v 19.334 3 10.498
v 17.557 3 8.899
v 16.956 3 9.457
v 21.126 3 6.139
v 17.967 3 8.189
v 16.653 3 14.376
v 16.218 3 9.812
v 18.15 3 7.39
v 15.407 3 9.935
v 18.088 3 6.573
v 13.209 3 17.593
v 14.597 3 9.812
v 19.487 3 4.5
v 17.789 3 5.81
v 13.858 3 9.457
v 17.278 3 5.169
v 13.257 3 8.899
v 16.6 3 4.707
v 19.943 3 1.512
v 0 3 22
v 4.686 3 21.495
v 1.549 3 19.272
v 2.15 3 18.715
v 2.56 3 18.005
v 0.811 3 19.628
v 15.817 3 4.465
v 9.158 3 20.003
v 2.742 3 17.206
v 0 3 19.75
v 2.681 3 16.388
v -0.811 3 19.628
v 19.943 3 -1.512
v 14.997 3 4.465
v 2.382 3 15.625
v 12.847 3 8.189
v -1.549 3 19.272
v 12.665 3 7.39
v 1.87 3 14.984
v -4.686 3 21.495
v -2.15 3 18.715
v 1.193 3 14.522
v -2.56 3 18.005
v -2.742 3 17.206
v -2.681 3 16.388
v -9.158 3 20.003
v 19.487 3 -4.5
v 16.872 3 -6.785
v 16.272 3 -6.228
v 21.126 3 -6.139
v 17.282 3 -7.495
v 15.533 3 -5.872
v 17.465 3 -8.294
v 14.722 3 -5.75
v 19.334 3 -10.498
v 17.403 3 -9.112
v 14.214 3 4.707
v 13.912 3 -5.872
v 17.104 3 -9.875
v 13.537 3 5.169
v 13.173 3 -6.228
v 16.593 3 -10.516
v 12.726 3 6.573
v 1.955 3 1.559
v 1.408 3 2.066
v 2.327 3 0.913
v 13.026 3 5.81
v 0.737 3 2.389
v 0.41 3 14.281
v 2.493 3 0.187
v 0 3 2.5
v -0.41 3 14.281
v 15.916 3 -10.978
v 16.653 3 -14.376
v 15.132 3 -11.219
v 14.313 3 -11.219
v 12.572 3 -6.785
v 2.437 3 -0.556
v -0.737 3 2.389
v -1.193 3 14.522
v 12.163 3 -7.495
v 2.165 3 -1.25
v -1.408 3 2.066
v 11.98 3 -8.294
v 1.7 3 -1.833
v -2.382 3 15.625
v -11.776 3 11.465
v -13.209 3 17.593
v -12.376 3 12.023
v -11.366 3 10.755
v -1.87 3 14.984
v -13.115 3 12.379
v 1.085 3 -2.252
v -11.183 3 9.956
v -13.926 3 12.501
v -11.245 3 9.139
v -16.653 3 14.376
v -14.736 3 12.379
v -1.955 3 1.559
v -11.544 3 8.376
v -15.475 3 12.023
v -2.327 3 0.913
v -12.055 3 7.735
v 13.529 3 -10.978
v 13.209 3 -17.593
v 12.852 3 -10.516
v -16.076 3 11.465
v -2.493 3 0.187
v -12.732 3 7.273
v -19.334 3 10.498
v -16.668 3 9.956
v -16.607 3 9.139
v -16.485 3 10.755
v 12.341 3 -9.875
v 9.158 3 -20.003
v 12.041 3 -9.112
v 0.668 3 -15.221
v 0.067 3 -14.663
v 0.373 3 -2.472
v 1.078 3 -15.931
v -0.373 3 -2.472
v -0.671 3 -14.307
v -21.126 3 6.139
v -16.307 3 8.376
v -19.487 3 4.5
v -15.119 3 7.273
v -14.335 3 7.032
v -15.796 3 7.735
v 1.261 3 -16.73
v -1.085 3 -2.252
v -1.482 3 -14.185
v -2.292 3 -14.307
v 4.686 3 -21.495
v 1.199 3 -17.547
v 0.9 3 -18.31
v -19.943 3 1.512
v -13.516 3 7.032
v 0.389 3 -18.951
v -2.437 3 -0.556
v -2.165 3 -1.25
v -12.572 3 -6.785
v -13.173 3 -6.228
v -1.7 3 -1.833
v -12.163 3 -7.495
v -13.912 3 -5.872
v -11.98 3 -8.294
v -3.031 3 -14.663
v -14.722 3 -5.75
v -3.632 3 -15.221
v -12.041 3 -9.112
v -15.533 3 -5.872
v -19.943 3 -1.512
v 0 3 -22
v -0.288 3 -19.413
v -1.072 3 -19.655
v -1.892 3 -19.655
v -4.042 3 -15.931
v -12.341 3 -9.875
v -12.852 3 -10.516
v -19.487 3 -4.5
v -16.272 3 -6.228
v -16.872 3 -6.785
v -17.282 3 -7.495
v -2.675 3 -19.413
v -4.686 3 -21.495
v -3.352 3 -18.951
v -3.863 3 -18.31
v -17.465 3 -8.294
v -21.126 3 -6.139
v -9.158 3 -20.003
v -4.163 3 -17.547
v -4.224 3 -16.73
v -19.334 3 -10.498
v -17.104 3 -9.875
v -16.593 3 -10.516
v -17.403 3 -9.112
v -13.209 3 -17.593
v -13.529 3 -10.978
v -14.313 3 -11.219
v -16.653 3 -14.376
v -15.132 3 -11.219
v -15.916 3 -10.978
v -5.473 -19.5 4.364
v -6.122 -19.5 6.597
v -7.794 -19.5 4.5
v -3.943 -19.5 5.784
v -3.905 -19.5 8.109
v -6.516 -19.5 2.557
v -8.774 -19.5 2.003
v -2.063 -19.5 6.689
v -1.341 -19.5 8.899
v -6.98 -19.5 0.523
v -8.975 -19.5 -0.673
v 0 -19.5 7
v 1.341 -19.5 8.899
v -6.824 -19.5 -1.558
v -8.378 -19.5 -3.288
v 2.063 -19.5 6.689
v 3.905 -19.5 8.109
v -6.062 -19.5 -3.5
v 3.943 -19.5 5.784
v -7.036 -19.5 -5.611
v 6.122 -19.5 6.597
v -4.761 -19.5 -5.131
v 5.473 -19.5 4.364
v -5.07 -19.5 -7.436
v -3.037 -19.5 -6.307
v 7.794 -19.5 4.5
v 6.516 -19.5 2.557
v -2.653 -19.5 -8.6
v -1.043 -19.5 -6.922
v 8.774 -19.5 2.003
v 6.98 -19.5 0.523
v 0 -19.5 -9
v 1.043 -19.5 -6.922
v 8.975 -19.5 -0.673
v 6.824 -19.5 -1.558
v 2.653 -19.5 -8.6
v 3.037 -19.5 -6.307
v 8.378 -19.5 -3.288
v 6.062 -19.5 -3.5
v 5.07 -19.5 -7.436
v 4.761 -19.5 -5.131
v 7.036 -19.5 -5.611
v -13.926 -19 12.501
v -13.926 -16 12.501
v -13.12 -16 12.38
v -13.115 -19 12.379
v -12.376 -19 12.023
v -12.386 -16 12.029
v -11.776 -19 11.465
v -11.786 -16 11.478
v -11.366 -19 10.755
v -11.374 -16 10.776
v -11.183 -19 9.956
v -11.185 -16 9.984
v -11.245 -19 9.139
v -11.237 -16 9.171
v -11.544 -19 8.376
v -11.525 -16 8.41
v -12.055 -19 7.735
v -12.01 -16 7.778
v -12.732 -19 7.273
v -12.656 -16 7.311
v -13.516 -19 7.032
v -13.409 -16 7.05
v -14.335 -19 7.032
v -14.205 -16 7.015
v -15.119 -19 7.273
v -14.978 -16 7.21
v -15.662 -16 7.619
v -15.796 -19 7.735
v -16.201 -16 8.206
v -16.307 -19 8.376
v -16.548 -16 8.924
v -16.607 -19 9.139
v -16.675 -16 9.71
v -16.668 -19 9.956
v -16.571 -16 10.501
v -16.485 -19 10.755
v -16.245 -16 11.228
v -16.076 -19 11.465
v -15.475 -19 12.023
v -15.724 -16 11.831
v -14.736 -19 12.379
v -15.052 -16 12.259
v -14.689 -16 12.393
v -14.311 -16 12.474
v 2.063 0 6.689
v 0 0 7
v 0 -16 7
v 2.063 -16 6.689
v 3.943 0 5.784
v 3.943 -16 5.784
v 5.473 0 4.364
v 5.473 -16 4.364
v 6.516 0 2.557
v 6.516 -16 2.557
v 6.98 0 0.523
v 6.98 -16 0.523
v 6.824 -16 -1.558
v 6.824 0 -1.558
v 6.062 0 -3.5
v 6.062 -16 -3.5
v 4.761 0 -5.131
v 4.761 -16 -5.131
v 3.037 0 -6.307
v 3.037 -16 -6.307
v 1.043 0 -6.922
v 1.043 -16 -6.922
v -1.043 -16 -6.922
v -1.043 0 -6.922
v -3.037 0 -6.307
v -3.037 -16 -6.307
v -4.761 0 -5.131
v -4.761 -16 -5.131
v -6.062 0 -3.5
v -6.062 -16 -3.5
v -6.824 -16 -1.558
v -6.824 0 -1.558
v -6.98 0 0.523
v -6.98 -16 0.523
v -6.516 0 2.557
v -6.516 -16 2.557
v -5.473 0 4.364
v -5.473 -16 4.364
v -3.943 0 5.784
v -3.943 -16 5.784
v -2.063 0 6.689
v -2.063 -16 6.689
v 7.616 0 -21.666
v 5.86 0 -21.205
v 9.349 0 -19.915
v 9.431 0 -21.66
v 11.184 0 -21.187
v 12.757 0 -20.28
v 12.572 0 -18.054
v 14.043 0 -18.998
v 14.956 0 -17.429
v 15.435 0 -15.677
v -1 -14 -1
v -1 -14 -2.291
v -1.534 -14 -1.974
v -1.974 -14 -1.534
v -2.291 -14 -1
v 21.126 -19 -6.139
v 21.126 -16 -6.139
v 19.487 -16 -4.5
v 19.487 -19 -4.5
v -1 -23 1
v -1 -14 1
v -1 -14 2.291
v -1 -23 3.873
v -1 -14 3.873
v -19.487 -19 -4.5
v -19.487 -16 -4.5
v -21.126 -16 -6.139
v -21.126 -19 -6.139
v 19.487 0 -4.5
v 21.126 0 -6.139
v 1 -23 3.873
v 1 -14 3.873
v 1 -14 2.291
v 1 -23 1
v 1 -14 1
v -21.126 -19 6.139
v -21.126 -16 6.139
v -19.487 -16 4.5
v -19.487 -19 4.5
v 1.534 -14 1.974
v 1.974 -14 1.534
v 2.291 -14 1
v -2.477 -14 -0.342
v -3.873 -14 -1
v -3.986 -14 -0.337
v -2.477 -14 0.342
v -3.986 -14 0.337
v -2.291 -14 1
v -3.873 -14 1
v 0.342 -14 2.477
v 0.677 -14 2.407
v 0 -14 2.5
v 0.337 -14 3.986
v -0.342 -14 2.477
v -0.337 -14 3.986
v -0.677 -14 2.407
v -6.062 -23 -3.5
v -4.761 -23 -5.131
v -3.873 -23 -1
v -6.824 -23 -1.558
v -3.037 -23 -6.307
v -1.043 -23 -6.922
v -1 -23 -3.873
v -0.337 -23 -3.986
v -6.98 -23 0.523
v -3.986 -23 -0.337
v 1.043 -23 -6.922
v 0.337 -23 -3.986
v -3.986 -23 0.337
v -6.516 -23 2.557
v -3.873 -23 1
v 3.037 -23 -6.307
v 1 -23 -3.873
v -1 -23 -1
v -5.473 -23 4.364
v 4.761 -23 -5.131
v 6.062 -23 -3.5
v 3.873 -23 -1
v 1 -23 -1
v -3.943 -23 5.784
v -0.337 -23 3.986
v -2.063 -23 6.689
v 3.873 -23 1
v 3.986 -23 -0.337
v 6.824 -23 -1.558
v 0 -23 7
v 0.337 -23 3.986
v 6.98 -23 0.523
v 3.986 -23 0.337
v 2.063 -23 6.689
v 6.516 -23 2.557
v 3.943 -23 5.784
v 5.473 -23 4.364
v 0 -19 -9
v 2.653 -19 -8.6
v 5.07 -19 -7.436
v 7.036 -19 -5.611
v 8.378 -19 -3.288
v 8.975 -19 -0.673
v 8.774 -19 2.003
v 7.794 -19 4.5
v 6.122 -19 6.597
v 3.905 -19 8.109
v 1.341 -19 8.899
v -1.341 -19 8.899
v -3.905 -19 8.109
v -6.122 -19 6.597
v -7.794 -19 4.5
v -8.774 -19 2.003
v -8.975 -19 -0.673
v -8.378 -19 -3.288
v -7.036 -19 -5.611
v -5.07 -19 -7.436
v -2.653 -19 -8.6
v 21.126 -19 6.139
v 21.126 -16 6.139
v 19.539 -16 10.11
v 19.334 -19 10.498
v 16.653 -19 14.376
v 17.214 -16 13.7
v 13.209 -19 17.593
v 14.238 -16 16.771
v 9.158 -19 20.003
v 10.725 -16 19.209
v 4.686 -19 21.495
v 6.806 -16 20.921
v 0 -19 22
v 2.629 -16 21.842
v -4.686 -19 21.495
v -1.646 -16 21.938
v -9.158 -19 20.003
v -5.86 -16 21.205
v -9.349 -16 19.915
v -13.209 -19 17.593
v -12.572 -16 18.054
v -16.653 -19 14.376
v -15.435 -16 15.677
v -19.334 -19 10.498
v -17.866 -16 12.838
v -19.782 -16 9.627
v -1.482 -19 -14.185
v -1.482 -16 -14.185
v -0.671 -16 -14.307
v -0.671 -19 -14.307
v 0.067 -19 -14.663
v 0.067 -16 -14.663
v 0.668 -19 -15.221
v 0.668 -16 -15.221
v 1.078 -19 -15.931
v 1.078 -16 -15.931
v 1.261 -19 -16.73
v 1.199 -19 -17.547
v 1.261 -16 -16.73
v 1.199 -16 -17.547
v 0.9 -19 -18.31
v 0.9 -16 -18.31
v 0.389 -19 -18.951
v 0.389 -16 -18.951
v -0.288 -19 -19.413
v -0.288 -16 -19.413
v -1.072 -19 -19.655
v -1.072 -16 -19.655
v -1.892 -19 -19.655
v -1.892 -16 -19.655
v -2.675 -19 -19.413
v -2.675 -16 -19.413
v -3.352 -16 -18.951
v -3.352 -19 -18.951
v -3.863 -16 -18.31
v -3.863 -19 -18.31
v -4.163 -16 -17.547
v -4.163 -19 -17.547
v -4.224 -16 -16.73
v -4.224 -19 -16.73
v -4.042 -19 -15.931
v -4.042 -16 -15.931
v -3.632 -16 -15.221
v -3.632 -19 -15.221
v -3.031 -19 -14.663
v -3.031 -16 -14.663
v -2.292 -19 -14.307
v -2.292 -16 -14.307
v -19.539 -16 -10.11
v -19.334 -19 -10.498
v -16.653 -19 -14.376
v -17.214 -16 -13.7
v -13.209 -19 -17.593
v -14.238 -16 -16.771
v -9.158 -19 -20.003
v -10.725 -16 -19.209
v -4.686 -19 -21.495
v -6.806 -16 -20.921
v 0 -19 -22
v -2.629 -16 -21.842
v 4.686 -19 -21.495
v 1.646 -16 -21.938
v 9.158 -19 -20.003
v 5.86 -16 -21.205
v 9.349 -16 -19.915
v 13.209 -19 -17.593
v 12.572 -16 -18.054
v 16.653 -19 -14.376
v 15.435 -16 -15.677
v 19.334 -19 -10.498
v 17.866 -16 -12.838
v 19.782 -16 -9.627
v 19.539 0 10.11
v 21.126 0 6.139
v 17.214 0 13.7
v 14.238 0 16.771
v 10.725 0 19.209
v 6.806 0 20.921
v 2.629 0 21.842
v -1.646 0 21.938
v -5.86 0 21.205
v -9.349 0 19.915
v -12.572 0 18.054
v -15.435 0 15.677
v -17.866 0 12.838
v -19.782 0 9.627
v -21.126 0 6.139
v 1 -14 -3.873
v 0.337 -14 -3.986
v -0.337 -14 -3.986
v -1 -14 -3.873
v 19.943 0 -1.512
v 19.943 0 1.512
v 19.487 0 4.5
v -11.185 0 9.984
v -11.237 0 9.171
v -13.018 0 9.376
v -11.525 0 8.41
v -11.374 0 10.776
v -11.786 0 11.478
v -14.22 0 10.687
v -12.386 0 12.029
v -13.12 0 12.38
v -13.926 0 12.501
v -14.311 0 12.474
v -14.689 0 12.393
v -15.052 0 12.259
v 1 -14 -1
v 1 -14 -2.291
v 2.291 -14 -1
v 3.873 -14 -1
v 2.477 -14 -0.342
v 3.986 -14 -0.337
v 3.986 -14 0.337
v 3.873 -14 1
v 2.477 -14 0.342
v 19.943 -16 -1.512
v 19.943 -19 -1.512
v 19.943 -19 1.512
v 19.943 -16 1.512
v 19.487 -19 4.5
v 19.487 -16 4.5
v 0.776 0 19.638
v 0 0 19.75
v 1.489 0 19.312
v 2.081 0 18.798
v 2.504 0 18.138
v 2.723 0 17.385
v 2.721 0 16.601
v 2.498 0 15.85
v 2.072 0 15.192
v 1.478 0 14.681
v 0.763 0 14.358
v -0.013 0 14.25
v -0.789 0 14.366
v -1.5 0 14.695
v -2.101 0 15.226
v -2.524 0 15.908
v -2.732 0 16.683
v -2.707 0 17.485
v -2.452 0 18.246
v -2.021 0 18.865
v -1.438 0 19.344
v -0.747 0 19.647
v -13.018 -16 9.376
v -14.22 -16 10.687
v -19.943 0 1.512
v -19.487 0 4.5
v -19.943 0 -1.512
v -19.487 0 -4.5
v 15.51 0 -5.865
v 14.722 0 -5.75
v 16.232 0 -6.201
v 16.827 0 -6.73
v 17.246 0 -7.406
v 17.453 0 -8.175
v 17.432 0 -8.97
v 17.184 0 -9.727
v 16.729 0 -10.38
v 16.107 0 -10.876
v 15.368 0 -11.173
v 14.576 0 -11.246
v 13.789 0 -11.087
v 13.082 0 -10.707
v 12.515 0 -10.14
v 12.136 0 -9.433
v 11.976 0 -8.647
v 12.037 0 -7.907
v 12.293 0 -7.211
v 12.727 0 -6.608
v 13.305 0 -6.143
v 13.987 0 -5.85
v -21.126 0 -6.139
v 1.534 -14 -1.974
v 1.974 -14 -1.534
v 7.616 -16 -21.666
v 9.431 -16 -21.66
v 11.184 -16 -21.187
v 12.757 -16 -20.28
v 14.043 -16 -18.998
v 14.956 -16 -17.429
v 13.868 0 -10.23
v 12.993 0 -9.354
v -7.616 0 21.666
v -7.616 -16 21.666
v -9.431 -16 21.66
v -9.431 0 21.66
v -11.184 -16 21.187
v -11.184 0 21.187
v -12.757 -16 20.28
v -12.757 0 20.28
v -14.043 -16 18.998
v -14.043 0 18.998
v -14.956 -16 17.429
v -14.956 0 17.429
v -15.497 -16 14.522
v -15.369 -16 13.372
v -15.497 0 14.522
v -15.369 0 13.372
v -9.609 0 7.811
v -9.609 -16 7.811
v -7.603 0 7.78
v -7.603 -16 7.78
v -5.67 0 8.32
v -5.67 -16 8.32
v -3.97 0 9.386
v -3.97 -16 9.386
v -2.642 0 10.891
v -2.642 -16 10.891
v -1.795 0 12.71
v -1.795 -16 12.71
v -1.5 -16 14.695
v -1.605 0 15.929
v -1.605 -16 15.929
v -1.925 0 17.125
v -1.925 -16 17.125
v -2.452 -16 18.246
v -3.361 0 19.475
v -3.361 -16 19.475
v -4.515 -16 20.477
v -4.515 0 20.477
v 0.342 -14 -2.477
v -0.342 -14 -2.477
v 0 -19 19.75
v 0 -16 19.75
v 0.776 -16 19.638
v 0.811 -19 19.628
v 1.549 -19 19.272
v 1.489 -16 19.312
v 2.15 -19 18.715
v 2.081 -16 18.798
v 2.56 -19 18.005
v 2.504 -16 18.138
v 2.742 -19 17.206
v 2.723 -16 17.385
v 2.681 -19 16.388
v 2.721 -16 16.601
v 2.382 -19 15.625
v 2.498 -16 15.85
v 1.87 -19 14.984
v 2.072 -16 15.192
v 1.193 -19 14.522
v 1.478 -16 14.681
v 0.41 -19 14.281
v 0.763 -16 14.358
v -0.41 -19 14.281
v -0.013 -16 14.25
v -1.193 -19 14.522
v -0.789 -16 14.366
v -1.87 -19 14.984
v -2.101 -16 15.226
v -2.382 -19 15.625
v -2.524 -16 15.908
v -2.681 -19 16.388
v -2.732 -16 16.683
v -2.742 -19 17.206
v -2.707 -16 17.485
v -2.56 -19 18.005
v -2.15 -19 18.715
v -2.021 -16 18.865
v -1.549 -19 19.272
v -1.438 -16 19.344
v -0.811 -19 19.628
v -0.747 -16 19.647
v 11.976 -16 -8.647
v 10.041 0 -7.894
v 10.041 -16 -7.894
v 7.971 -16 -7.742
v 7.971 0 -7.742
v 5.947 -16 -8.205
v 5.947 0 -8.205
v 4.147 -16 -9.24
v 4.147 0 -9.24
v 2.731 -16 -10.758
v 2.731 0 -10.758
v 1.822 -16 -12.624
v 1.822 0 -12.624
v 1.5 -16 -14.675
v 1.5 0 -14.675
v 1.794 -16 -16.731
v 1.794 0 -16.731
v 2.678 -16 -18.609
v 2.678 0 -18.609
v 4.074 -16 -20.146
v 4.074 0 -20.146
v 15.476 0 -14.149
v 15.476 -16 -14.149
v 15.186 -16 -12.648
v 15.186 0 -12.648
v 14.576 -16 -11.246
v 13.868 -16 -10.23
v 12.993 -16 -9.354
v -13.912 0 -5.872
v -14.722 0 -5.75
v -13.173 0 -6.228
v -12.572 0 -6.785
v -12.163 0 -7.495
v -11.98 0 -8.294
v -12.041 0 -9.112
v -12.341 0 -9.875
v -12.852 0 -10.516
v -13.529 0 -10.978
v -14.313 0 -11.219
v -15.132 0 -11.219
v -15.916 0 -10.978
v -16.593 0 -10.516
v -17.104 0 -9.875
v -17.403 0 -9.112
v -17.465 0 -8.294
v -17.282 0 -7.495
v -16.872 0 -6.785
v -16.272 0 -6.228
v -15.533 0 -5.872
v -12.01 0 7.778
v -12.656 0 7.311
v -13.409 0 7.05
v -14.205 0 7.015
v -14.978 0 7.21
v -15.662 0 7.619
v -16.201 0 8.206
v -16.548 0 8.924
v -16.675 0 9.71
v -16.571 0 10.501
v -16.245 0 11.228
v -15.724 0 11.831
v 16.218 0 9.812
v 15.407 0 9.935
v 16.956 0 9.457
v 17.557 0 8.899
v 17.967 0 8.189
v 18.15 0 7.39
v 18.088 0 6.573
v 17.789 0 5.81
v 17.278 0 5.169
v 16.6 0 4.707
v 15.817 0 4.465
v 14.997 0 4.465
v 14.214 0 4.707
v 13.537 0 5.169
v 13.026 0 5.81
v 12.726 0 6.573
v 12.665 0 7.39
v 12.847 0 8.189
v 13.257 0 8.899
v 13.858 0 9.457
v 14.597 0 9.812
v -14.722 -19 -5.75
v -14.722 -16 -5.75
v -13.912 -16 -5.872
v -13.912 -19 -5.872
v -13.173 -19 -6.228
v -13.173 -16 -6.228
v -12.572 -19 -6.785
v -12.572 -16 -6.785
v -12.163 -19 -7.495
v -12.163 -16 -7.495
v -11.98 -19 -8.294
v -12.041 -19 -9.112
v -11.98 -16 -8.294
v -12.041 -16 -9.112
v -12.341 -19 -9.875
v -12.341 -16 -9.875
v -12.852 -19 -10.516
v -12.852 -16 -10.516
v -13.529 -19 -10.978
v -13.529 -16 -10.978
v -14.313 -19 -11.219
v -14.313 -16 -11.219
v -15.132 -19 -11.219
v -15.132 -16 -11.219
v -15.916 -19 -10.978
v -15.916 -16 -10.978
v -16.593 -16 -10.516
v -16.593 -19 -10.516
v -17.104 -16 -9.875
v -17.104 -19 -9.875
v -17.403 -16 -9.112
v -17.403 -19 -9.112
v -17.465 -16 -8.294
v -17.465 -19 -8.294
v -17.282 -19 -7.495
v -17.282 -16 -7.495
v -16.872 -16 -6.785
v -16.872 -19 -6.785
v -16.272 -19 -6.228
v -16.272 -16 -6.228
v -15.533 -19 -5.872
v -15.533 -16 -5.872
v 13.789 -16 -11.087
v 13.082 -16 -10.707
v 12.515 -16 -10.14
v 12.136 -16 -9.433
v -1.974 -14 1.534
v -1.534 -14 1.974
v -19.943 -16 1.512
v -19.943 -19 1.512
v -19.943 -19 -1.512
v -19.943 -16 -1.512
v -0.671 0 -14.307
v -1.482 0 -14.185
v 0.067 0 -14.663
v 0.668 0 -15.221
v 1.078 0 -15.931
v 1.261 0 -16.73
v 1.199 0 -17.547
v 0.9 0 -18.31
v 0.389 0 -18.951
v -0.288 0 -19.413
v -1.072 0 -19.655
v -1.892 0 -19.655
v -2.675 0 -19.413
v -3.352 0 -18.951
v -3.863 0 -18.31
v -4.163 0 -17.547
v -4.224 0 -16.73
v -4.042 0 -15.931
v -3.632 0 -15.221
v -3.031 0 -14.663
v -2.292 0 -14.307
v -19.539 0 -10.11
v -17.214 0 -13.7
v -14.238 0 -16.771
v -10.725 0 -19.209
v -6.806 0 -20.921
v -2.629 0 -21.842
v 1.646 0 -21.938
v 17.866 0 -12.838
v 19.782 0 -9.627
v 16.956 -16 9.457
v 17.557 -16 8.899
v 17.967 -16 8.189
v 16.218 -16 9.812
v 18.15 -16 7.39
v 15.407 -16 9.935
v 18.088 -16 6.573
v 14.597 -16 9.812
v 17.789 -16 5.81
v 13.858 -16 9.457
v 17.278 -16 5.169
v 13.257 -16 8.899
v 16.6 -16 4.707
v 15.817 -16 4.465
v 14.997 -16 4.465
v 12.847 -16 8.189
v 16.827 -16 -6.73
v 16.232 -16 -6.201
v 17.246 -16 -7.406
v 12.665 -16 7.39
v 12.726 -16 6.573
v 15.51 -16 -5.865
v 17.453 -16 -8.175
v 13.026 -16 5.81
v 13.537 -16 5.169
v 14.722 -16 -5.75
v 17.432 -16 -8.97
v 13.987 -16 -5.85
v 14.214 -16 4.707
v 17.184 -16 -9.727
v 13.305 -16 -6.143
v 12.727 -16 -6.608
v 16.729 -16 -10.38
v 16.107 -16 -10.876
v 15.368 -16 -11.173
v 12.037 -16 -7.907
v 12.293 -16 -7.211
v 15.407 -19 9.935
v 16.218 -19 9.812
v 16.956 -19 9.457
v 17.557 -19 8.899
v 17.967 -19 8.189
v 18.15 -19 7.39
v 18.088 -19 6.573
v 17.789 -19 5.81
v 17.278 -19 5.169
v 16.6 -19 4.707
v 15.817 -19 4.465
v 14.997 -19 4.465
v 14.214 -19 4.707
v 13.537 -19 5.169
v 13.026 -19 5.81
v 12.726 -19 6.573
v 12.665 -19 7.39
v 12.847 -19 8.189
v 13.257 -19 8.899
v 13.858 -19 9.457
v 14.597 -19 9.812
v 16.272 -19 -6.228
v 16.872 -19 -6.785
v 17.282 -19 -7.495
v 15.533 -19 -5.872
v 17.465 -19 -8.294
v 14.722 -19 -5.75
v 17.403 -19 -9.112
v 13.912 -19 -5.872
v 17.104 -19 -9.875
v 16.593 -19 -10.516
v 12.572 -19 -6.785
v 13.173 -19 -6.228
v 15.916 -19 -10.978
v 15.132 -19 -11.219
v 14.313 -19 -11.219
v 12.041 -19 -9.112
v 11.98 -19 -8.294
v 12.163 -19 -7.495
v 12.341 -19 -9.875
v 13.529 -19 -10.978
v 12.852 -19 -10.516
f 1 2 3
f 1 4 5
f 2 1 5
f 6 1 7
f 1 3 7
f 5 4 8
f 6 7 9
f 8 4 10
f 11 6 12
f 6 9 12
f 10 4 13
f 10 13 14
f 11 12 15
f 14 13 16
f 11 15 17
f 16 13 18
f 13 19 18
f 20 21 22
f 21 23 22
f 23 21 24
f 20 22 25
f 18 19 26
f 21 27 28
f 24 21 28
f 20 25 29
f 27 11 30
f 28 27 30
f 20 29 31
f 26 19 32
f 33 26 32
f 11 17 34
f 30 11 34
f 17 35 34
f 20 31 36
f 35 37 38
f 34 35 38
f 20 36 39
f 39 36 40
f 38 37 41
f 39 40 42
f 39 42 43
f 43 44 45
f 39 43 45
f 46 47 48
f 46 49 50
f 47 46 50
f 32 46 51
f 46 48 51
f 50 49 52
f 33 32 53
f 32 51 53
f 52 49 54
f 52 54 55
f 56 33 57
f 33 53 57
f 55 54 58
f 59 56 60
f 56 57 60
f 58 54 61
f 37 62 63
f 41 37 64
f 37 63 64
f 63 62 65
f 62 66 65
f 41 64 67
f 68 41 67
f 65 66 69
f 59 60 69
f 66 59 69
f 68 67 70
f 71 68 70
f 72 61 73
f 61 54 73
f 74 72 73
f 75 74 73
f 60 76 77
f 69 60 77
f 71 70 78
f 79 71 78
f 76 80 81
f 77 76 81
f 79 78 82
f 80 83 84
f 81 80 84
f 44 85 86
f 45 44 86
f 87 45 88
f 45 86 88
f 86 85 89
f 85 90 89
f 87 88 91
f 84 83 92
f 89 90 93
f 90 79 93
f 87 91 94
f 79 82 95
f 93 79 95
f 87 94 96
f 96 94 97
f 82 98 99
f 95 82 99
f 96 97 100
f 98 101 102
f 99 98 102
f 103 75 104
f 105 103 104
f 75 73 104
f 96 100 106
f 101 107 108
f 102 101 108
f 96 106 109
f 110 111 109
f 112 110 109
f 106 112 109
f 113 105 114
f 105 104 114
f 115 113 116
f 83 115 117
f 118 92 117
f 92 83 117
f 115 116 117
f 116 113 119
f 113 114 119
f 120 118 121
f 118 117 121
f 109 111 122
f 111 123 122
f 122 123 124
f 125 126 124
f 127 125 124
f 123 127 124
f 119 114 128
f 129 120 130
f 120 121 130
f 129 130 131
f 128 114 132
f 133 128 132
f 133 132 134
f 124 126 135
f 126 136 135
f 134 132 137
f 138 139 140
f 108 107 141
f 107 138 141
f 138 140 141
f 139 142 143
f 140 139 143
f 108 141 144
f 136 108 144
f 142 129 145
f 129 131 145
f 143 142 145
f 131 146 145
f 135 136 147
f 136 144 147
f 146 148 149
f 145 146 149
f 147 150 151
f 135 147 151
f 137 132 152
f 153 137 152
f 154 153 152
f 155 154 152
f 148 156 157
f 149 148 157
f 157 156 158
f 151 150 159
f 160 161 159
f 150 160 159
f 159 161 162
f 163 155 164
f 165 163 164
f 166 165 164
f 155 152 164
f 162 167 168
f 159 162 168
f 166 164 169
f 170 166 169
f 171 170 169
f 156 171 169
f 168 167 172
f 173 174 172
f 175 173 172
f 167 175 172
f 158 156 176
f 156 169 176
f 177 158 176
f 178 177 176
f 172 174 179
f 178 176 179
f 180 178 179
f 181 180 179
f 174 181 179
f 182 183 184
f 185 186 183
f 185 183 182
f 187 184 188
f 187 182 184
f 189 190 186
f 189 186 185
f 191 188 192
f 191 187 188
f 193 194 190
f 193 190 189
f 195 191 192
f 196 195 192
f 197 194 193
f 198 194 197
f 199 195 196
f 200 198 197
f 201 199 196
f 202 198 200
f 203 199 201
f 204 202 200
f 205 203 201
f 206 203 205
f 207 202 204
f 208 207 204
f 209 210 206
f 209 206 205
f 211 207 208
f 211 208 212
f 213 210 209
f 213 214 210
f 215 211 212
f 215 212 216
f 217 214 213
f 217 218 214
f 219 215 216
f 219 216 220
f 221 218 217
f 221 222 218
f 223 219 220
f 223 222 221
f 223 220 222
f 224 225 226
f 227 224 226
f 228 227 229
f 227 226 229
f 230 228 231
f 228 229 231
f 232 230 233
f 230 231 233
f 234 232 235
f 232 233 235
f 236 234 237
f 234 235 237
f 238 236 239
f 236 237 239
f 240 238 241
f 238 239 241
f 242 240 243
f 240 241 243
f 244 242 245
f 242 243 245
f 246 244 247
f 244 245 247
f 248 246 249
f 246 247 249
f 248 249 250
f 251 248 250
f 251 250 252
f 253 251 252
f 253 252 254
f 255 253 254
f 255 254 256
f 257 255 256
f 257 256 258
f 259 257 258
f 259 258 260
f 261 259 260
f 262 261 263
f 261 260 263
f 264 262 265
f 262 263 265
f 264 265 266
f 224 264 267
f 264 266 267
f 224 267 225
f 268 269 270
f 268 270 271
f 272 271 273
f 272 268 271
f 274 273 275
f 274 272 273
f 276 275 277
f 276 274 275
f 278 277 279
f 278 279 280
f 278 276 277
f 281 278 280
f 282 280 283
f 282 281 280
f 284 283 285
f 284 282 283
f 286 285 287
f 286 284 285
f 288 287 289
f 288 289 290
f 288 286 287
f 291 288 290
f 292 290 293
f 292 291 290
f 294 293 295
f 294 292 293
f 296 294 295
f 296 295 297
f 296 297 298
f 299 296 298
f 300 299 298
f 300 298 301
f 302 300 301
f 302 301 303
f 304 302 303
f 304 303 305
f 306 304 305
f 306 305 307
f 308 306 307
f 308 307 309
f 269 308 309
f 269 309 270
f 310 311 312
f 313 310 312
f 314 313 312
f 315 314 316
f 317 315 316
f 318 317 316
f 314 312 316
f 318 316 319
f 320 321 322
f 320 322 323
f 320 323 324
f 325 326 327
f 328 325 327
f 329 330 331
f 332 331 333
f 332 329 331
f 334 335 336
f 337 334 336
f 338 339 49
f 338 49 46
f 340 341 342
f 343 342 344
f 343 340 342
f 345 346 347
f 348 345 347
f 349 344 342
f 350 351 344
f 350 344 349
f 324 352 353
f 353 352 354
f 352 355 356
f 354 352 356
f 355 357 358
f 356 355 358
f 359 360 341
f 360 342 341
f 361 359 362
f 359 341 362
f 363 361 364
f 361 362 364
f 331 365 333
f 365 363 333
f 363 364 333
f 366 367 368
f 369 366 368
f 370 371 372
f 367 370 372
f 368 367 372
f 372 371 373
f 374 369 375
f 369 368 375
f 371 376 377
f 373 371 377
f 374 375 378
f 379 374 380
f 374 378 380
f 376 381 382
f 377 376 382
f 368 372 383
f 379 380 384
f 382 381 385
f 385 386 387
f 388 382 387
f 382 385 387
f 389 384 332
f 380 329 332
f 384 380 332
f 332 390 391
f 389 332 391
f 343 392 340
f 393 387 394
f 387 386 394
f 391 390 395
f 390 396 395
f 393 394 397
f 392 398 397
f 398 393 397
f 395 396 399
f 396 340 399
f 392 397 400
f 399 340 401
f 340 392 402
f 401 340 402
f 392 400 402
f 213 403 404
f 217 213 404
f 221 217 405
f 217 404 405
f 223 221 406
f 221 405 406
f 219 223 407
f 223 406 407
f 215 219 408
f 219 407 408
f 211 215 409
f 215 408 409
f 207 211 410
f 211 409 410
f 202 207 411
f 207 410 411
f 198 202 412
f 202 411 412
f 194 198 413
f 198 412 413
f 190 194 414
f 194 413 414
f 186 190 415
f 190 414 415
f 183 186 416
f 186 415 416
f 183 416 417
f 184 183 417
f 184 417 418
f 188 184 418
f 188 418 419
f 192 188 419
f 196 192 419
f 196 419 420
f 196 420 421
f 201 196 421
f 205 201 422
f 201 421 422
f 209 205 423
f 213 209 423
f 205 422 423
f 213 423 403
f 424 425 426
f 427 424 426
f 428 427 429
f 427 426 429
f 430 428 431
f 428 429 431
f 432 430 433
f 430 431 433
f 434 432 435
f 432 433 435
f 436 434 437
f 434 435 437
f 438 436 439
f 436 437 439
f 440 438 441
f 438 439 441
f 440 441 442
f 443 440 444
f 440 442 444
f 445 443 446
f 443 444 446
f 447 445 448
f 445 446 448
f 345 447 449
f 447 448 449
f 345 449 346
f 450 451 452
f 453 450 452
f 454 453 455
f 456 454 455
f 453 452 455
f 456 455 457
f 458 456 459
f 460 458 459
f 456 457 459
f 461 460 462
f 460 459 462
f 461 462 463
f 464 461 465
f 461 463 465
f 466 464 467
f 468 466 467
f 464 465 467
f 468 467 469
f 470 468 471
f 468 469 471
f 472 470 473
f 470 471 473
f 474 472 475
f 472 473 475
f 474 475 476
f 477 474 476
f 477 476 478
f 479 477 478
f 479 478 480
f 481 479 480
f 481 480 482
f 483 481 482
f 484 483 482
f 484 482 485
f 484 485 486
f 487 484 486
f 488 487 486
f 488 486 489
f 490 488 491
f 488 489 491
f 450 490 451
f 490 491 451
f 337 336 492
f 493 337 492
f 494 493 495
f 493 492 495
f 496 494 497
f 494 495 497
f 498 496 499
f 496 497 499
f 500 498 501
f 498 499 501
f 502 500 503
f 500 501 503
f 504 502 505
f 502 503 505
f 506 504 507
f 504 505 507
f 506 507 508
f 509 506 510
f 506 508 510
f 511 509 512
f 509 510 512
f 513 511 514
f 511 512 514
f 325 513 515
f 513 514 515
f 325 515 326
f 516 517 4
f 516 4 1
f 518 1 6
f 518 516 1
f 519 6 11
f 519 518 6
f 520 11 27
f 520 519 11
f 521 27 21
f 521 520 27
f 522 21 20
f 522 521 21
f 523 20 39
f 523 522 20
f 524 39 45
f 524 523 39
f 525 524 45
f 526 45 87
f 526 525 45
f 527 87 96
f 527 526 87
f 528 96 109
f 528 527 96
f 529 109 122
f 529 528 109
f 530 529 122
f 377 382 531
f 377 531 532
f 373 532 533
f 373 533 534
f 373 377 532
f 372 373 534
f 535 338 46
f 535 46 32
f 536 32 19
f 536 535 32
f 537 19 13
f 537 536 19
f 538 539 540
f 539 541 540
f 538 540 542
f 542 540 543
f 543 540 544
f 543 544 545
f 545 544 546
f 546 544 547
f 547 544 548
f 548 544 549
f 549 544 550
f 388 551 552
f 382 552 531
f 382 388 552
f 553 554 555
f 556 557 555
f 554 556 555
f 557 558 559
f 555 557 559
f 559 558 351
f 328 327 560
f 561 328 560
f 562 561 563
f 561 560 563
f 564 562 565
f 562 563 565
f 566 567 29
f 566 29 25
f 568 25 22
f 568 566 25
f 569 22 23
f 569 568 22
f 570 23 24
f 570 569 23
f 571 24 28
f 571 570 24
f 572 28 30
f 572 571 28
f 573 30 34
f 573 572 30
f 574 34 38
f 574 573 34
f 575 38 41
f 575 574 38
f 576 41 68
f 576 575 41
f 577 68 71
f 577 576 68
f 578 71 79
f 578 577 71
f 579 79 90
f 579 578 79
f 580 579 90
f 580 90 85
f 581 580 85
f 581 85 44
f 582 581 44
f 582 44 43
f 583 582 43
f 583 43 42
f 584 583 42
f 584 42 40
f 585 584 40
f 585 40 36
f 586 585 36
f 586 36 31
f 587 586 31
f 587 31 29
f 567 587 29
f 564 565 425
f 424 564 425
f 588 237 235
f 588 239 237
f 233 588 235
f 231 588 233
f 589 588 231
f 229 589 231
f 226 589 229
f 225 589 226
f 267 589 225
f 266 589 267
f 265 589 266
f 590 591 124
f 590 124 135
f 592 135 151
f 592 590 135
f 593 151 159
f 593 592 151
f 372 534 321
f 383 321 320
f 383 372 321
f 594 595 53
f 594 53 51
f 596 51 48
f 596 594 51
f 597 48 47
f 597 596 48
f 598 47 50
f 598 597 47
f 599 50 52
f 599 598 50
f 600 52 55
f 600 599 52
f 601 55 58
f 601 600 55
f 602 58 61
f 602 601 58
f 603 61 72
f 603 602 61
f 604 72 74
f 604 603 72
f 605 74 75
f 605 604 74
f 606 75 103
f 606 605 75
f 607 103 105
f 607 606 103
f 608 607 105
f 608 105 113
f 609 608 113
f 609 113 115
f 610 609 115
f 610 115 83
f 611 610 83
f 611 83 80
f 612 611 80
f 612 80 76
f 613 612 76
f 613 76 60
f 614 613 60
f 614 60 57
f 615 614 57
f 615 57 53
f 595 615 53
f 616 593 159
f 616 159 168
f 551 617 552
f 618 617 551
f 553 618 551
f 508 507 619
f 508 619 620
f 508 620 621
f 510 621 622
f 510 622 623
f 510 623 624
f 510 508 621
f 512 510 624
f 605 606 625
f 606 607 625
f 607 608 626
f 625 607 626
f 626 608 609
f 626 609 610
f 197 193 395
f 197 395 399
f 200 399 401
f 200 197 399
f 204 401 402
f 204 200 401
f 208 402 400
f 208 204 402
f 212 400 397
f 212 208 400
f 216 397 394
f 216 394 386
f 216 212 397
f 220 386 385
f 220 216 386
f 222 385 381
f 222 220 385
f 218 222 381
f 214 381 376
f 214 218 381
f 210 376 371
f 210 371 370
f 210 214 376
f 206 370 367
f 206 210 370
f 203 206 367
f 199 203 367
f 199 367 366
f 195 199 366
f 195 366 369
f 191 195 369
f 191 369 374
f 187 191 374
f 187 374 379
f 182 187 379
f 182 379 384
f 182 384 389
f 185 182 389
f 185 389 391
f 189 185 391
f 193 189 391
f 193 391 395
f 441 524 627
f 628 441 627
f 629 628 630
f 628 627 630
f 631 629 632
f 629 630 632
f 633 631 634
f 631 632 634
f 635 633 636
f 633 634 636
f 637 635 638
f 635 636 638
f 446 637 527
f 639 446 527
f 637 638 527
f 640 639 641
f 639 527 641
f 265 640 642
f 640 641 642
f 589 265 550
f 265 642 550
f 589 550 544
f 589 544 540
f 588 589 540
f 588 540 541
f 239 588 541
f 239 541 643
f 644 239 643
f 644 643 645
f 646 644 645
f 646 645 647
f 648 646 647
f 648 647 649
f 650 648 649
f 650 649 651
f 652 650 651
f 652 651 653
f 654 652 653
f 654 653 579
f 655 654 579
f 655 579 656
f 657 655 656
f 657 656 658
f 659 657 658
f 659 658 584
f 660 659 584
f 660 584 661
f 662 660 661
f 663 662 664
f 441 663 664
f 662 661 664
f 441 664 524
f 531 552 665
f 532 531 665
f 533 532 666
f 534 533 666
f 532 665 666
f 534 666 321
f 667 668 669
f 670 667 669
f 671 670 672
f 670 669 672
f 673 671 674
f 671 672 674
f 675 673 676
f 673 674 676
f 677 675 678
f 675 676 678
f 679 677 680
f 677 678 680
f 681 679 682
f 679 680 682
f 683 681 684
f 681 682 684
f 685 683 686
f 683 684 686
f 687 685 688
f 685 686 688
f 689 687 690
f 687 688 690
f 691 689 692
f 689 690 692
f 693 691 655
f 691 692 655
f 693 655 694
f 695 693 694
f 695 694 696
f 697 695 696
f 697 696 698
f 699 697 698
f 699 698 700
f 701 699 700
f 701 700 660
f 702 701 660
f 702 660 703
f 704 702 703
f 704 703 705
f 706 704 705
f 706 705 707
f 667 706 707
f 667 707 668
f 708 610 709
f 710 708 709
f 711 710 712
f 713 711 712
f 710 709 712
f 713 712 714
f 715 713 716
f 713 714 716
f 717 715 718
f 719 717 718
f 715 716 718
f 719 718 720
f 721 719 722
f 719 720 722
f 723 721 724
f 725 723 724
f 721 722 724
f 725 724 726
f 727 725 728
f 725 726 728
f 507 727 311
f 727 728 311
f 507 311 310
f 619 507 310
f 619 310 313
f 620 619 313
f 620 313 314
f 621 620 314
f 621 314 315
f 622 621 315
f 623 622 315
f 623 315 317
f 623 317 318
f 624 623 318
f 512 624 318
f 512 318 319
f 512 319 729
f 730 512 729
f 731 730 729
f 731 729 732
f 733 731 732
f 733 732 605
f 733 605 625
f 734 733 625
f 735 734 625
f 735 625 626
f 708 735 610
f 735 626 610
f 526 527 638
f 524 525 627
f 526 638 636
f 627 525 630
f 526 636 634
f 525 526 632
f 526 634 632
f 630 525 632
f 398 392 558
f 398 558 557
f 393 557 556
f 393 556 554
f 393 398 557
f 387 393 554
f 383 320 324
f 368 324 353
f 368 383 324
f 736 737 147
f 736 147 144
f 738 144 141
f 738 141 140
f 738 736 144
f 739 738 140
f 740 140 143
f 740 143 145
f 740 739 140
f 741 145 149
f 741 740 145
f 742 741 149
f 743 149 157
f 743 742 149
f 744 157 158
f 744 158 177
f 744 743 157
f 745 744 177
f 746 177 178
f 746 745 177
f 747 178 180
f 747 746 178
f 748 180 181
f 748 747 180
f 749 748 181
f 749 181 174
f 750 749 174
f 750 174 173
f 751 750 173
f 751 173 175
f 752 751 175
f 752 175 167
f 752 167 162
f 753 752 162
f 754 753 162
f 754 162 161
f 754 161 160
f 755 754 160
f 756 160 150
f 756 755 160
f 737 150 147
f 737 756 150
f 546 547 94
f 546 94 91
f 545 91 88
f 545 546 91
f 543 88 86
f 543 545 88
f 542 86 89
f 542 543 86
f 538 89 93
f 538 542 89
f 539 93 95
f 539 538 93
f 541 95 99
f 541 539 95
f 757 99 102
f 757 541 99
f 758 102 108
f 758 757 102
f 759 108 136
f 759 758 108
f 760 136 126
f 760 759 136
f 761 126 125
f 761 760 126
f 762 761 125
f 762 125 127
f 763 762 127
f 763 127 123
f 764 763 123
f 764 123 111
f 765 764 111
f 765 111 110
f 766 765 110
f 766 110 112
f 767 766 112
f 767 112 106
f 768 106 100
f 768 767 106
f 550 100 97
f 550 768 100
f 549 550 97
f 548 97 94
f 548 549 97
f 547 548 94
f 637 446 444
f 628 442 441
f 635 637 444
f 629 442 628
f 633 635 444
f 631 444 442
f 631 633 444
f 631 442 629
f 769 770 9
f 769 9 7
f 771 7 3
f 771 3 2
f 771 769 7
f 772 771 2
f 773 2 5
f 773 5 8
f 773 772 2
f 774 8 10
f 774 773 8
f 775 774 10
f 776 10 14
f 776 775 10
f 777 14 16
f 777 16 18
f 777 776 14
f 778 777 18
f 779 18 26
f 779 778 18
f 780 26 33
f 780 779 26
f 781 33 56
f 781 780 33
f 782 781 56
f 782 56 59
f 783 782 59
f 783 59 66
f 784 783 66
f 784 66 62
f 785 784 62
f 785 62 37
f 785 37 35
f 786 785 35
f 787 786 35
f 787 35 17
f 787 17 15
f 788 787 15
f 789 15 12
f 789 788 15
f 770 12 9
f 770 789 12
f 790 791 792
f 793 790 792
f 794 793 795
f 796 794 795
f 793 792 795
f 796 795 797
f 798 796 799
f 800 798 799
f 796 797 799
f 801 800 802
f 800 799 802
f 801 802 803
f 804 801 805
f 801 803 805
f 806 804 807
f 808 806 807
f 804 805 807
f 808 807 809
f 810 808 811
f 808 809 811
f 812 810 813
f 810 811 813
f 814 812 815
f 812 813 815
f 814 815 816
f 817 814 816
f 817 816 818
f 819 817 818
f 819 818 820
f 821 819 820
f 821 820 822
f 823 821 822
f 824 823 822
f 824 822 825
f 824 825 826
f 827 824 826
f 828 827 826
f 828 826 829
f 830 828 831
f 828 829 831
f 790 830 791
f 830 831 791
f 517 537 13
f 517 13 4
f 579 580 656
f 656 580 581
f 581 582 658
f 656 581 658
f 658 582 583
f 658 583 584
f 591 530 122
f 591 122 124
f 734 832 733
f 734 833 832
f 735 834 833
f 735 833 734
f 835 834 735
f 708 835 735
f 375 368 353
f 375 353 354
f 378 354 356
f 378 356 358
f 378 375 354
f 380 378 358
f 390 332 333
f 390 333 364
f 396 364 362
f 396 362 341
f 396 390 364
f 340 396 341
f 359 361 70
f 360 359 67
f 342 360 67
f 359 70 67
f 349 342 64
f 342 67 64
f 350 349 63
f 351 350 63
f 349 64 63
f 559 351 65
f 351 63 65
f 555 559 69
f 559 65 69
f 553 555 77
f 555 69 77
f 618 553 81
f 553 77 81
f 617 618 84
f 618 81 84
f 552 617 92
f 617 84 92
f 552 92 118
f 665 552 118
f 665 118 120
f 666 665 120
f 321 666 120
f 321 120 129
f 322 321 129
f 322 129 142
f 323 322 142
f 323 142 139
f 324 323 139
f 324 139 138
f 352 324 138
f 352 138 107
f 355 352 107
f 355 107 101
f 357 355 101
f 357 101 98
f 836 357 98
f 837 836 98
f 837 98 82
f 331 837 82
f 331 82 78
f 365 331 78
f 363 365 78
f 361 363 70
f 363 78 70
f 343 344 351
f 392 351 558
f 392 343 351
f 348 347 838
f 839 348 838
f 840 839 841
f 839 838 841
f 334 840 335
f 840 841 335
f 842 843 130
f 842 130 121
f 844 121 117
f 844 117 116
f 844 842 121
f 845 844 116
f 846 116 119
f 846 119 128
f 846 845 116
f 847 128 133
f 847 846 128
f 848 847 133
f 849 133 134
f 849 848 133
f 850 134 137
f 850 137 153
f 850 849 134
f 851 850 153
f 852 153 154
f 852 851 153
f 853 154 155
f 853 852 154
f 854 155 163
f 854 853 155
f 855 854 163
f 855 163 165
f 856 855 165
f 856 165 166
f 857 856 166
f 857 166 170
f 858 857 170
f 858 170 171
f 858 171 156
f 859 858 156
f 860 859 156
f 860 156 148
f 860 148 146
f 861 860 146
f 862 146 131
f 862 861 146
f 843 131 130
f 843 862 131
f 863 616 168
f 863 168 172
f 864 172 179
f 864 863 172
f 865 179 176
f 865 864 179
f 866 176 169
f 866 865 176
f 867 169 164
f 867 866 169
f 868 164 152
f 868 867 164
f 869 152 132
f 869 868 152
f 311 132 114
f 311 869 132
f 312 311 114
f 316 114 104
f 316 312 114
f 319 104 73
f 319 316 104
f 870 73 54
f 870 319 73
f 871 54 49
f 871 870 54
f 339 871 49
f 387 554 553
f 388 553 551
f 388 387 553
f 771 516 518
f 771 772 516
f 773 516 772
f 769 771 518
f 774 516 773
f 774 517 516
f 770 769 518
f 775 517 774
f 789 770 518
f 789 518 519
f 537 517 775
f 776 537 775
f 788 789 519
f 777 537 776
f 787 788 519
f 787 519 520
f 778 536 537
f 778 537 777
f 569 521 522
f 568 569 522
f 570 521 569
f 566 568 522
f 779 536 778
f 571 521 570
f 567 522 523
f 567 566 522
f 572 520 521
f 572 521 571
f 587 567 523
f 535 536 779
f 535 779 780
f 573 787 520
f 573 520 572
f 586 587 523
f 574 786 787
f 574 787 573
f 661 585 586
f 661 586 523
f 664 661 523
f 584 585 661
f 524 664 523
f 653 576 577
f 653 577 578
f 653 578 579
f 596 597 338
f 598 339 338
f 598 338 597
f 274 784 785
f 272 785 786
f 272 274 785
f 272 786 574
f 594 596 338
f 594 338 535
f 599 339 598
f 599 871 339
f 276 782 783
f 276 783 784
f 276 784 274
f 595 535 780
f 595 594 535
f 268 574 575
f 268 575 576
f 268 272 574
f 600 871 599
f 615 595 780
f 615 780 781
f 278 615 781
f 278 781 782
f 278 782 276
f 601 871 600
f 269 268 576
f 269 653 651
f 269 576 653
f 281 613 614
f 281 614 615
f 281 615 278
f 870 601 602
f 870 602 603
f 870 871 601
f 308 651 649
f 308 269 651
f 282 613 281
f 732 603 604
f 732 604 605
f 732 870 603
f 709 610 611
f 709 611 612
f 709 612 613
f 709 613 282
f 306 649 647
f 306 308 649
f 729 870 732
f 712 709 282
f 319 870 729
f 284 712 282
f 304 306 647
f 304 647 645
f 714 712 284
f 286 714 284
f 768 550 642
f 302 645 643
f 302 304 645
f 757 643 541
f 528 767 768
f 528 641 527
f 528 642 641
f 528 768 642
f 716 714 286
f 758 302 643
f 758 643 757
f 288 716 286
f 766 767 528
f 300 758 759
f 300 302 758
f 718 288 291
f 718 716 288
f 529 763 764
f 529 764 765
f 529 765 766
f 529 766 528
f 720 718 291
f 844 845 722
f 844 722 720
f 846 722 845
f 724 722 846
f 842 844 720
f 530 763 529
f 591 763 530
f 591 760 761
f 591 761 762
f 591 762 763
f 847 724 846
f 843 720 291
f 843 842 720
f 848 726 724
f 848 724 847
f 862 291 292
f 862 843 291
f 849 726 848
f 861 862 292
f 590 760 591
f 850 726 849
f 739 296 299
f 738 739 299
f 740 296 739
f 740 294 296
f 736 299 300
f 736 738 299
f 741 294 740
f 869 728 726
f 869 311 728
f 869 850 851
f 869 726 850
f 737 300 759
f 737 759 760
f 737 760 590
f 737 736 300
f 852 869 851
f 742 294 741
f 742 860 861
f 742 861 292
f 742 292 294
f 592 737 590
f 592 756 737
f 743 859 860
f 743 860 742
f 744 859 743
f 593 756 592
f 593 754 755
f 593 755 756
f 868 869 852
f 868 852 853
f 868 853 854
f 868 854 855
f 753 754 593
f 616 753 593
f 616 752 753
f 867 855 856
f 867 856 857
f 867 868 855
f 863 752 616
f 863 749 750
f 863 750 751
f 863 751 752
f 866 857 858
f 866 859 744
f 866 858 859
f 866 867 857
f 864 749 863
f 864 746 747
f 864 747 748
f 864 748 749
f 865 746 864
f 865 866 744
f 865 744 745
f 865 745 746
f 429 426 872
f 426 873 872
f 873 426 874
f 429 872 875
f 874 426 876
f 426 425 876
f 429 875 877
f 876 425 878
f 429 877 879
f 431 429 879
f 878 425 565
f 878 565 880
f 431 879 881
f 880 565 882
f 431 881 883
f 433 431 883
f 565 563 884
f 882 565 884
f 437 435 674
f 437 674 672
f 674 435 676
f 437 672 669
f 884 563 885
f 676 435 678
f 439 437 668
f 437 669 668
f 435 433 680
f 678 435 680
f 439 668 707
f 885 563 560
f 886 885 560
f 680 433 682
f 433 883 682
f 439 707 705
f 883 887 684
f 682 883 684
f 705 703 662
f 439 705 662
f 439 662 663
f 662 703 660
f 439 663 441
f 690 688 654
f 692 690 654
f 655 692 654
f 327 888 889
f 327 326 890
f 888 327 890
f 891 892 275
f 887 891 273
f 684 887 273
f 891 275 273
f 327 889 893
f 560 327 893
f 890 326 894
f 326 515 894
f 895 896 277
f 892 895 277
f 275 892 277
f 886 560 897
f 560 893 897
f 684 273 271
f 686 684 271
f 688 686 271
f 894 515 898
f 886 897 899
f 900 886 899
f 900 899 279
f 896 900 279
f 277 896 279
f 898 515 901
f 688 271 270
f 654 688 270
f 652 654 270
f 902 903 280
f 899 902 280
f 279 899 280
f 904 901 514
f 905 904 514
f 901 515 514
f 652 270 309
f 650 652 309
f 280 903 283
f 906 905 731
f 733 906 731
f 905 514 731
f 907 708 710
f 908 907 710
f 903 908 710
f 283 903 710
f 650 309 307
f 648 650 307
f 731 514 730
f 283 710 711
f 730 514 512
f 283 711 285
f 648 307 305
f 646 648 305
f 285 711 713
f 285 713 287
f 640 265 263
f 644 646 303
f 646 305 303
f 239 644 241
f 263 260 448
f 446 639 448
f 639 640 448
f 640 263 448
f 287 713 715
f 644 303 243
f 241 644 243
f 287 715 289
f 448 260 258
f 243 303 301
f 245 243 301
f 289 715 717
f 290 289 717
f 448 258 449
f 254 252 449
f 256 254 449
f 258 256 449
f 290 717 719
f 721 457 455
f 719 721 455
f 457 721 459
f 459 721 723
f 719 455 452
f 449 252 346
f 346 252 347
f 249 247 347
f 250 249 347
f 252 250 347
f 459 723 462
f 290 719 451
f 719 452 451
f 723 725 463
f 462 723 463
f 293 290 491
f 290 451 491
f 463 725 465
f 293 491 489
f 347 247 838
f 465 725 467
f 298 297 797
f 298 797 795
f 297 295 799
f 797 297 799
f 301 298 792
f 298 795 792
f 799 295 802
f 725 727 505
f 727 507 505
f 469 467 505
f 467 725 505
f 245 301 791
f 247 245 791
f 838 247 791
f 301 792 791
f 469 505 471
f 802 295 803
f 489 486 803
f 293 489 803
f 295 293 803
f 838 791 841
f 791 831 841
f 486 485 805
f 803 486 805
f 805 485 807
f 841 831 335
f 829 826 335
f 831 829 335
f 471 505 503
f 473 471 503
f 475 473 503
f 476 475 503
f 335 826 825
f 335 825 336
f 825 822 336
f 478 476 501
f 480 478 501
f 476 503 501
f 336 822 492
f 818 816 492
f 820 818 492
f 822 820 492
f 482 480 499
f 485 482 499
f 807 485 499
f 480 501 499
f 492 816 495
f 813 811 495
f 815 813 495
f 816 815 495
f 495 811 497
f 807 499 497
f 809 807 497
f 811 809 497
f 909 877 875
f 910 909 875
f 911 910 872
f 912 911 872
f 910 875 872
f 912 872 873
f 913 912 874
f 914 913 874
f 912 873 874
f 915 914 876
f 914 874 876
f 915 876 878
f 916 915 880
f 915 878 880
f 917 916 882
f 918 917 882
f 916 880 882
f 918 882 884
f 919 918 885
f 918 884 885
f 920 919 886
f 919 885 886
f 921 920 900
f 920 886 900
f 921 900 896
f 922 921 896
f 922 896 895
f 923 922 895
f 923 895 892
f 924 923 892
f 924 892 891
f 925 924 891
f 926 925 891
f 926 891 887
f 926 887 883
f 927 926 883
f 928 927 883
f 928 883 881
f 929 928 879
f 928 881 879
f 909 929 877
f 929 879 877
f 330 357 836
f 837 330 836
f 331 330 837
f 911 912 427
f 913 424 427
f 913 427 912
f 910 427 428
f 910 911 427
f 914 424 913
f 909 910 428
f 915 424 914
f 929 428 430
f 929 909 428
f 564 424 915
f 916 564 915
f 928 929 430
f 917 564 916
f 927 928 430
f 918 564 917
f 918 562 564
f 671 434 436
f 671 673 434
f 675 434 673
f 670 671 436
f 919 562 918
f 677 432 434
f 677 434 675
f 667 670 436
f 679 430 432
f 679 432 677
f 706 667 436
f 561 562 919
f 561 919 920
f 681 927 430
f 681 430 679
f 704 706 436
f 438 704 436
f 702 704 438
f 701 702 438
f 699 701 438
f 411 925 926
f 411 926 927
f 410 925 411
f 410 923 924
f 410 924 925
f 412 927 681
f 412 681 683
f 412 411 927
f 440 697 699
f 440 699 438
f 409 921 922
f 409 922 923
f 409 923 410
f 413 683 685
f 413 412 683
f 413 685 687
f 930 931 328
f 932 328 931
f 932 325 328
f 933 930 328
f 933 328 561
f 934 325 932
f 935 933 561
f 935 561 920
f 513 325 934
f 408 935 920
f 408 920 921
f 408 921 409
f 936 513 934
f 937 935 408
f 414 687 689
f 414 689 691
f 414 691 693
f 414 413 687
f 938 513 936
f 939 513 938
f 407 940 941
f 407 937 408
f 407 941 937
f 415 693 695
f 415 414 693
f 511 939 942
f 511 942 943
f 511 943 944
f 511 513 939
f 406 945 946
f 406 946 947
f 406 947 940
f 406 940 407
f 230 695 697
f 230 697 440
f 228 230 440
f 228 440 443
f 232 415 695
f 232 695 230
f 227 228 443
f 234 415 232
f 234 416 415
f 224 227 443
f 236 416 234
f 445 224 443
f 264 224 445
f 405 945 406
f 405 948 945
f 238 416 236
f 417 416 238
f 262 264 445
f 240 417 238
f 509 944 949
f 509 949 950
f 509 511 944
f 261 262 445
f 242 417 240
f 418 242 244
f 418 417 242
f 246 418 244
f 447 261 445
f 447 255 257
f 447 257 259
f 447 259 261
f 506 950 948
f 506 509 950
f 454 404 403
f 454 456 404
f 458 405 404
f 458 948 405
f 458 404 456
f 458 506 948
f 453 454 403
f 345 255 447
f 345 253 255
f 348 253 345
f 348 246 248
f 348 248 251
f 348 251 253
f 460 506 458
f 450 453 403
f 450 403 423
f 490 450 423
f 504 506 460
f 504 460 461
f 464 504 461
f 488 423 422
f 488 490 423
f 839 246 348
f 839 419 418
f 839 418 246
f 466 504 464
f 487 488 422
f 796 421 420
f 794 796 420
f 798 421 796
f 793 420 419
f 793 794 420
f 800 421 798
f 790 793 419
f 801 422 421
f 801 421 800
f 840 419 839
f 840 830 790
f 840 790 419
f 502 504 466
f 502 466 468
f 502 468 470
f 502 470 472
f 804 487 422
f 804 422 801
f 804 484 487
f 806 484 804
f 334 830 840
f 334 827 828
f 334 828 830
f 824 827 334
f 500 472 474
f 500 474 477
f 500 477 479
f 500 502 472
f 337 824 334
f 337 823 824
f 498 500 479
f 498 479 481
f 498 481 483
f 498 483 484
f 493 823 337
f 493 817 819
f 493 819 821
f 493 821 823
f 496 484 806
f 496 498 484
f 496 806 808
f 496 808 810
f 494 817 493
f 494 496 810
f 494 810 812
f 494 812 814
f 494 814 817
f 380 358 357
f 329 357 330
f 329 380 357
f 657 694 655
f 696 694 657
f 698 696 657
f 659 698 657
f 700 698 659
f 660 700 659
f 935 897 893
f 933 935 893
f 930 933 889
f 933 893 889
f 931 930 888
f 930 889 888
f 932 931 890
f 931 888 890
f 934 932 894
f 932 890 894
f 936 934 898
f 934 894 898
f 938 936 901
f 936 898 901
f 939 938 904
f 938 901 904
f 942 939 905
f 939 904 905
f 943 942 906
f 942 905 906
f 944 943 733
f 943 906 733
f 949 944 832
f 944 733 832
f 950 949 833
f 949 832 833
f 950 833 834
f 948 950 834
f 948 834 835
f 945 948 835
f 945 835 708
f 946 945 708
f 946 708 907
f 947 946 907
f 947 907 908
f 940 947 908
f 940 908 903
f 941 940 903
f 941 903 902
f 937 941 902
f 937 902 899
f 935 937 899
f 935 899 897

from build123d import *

# Parameters (mm, degrees)
SKETCH1_R           = 7
SKETCH1_R_2         = 2.75
BOSS_EXTRUDE1_DEPTH = 3
SKETCH2_R           = 7
BOSS_EXTRUDE2_DEPTH = 16
SKETCH3_R           = 7
BOSS_EXTRUDE3_DEPTH = 26
CUT_EXTRUDE1_DEPTH  = 9
SKETCH5_R           = 9
SKETCH5_R_2         = 7
BOSS_EXTRUDE4_DEPTH = 0.5
SKETCH6_R           = 2.5
CUT_EXTRUDE2_DEPTH  = 17


with BuildPart() as part:
    # Sketch1 → Boss-Extrude1 (new body)
    with BuildSketch(Plane(origin=(0, 0, 0), x_dir=(1, 0, 0), z_dir=(0, 1, 0))):
        with BuildLine():
            Line((19.48717527, -4.5), (21.126127543, -6.138952274))
            ThreePointArc((21.126127543, -6.138952274), (0, -22), (-21.126127543, -6.138952274))
            Line((-21.126127543, -6.138952274), (-19.48717527, -4.5))
            ThreePointArc((-19.48717527, -4.5), (-20, 0), (-19.48717527, 4.5))
            Line((-19.48717527, 4.5), (-21.126127543, 6.138952274))
            ThreePointArc((-21.126127543, 6.138952274), (0, 22), (21.126127543, 6.138952274))
            Line((21.126127543, 6.138952274), (19.48717527, 4.5))
            ThreePointArc((19.48717527, 4.5), (20, 0), (19.48717527, -4.5))
        make_face()
        with Locations(Location((0, 0, 0), (0, 0, 270))):
            Circle(SKETCH1_R, mode=Mode.SUBTRACT)
        with Locations(Location((0, -17, 0), (0, 0, 270))):
            Circle(SKETCH1_R_2, mode=Mode.SUBTRACT)
        with Locations(Location((-14.722431864, 8.5, 0), (0, 0, 270))):
            Circle(SKETCH1_R_2, mode=Mode.SUBTRACT)
        with Locations(Location((14.722431864, 8.5, 0), (0, 0, 270))):
            Circle(SKETCH1_R_2, mode=Mode.SUBTRACT)
        with Locations(Location((15.40723238, -7.18451045, 0), (0, 0, 270))):
            Circle(SKETCH1_R_2, mode=Mode.SUBTRACT)
        with Locations(Location((-13.925584753, -9.750799418, 0), (0, 0, 270))):
            Circle(SKETCH1_R_2, mode=Mode.SUBTRACT)
        with Locations(Location((-1.481647627, 16.935309868, 0), (0, 0, 270))):
            Circle(SKETCH1_R_2, mode=Mode.SUBTRACT)
    boss_extrude1 = extrude(amount=BOSS_EXTRUDE1_DEPTH)

    # Sketch2 → Boss-Extrude2 (add)
    with BuildSketch(Plane.XZ):
        with Locations(Location((-8.5, 14.722431864, 0), (0, 0, 67.839045349))):
            Circle(SKETCH2_R)
        with Locations(Location((8.5, -14.722431864, 0), (0, 0, 60.223318028))):
            Circle(SKETCH2_R)
    extrude(amount=BOSS_EXTRUDE2_DEPTH)

    # Mirror1: Boss-Extrude1 across plane
    add(boss_extrude1.mirror(Plane(origin=(0, -8, 0), x_dir=(0, 0, 1), z_dir=(0, -1, 0))))

    # Sketch3 → Boss-Extrude3 (add)
    with BuildSketch(Plane(origin=(0, 3, 0), x_dir=(1, 0, 0), z_dir=(0, 1, 0))):
        with Locations(Location((0, 0, 0), (0, 0, 270))):
            Circle(SKETCH3_R)
    extrude(amount=-BOSS_EXTRUDE3_DEPTH)

    # Sketch4 → Cut-Extrude1 (cut)
    with BuildSketch(Plane.XZ.offset(23)):
        with BuildLine():
            Line((1, -1), (1, -3.872983346))
            ThreePointArc((1, -3.872983346), (0, -4), (-1, -3.872983346))
            Line((-1, -3.872983346), (-1, -1))
            Line((-1, -1), (-3.872983346, -1))
            ThreePointArc((-3.872983346, -1), (-4, 0), (-3.872983346, 1))
            Line((-3.872983346, 1), (-1, 1))
            Line((-1, 1), (-1, 3.872983346))
            ThreePointArc((-1, 3.872983346), (0, 4), (1, 3.872983346))
            Line((1, 3.872983346), (1, 1))
            Line((1, 1), (3.872983346, 1))
            ThreePointArc((3.872983346, 1), (4, 0), (3.872983346, -1))
            Line((3.872983346, -1), (1, -1))
        make_face()
    extrude(amount=-CUT_EXTRUDE1_DEPTH, mode=Mode.SUBTRACT)

    # Sketch5 → Boss-Extrude4 (add)
    with BuildSketch(Plane.XZ.offset(19)):
        with Locations(Location((0, 0, 0), (0, 0, 270))):
            Circle(SKETCH5_R)
        with Locations(Location((0, 0, 0), (0, 0, 90))):
            Circle(SKETCH5_R_2, mode=Mode.SUBTRACT)
    extrude(amount=BOSS_EXTRUDE4_DEPTH)

    # Sketch6 → Cut-Extrude2 (cut)
    with BuildSketch(Plane(origin=(0, 3, 0), x_dir=(1, 0, 0), z_dir=(0, 1, 0))):
        with Locations(Location((0, 0, 0), (0, 0, 270))):
            Circle(SKETCH6_R)
    extrude(amount=-CUT_EXTRUDE2_DEPTH, mode=Mode.SUBTRACT)


solid = part.part
